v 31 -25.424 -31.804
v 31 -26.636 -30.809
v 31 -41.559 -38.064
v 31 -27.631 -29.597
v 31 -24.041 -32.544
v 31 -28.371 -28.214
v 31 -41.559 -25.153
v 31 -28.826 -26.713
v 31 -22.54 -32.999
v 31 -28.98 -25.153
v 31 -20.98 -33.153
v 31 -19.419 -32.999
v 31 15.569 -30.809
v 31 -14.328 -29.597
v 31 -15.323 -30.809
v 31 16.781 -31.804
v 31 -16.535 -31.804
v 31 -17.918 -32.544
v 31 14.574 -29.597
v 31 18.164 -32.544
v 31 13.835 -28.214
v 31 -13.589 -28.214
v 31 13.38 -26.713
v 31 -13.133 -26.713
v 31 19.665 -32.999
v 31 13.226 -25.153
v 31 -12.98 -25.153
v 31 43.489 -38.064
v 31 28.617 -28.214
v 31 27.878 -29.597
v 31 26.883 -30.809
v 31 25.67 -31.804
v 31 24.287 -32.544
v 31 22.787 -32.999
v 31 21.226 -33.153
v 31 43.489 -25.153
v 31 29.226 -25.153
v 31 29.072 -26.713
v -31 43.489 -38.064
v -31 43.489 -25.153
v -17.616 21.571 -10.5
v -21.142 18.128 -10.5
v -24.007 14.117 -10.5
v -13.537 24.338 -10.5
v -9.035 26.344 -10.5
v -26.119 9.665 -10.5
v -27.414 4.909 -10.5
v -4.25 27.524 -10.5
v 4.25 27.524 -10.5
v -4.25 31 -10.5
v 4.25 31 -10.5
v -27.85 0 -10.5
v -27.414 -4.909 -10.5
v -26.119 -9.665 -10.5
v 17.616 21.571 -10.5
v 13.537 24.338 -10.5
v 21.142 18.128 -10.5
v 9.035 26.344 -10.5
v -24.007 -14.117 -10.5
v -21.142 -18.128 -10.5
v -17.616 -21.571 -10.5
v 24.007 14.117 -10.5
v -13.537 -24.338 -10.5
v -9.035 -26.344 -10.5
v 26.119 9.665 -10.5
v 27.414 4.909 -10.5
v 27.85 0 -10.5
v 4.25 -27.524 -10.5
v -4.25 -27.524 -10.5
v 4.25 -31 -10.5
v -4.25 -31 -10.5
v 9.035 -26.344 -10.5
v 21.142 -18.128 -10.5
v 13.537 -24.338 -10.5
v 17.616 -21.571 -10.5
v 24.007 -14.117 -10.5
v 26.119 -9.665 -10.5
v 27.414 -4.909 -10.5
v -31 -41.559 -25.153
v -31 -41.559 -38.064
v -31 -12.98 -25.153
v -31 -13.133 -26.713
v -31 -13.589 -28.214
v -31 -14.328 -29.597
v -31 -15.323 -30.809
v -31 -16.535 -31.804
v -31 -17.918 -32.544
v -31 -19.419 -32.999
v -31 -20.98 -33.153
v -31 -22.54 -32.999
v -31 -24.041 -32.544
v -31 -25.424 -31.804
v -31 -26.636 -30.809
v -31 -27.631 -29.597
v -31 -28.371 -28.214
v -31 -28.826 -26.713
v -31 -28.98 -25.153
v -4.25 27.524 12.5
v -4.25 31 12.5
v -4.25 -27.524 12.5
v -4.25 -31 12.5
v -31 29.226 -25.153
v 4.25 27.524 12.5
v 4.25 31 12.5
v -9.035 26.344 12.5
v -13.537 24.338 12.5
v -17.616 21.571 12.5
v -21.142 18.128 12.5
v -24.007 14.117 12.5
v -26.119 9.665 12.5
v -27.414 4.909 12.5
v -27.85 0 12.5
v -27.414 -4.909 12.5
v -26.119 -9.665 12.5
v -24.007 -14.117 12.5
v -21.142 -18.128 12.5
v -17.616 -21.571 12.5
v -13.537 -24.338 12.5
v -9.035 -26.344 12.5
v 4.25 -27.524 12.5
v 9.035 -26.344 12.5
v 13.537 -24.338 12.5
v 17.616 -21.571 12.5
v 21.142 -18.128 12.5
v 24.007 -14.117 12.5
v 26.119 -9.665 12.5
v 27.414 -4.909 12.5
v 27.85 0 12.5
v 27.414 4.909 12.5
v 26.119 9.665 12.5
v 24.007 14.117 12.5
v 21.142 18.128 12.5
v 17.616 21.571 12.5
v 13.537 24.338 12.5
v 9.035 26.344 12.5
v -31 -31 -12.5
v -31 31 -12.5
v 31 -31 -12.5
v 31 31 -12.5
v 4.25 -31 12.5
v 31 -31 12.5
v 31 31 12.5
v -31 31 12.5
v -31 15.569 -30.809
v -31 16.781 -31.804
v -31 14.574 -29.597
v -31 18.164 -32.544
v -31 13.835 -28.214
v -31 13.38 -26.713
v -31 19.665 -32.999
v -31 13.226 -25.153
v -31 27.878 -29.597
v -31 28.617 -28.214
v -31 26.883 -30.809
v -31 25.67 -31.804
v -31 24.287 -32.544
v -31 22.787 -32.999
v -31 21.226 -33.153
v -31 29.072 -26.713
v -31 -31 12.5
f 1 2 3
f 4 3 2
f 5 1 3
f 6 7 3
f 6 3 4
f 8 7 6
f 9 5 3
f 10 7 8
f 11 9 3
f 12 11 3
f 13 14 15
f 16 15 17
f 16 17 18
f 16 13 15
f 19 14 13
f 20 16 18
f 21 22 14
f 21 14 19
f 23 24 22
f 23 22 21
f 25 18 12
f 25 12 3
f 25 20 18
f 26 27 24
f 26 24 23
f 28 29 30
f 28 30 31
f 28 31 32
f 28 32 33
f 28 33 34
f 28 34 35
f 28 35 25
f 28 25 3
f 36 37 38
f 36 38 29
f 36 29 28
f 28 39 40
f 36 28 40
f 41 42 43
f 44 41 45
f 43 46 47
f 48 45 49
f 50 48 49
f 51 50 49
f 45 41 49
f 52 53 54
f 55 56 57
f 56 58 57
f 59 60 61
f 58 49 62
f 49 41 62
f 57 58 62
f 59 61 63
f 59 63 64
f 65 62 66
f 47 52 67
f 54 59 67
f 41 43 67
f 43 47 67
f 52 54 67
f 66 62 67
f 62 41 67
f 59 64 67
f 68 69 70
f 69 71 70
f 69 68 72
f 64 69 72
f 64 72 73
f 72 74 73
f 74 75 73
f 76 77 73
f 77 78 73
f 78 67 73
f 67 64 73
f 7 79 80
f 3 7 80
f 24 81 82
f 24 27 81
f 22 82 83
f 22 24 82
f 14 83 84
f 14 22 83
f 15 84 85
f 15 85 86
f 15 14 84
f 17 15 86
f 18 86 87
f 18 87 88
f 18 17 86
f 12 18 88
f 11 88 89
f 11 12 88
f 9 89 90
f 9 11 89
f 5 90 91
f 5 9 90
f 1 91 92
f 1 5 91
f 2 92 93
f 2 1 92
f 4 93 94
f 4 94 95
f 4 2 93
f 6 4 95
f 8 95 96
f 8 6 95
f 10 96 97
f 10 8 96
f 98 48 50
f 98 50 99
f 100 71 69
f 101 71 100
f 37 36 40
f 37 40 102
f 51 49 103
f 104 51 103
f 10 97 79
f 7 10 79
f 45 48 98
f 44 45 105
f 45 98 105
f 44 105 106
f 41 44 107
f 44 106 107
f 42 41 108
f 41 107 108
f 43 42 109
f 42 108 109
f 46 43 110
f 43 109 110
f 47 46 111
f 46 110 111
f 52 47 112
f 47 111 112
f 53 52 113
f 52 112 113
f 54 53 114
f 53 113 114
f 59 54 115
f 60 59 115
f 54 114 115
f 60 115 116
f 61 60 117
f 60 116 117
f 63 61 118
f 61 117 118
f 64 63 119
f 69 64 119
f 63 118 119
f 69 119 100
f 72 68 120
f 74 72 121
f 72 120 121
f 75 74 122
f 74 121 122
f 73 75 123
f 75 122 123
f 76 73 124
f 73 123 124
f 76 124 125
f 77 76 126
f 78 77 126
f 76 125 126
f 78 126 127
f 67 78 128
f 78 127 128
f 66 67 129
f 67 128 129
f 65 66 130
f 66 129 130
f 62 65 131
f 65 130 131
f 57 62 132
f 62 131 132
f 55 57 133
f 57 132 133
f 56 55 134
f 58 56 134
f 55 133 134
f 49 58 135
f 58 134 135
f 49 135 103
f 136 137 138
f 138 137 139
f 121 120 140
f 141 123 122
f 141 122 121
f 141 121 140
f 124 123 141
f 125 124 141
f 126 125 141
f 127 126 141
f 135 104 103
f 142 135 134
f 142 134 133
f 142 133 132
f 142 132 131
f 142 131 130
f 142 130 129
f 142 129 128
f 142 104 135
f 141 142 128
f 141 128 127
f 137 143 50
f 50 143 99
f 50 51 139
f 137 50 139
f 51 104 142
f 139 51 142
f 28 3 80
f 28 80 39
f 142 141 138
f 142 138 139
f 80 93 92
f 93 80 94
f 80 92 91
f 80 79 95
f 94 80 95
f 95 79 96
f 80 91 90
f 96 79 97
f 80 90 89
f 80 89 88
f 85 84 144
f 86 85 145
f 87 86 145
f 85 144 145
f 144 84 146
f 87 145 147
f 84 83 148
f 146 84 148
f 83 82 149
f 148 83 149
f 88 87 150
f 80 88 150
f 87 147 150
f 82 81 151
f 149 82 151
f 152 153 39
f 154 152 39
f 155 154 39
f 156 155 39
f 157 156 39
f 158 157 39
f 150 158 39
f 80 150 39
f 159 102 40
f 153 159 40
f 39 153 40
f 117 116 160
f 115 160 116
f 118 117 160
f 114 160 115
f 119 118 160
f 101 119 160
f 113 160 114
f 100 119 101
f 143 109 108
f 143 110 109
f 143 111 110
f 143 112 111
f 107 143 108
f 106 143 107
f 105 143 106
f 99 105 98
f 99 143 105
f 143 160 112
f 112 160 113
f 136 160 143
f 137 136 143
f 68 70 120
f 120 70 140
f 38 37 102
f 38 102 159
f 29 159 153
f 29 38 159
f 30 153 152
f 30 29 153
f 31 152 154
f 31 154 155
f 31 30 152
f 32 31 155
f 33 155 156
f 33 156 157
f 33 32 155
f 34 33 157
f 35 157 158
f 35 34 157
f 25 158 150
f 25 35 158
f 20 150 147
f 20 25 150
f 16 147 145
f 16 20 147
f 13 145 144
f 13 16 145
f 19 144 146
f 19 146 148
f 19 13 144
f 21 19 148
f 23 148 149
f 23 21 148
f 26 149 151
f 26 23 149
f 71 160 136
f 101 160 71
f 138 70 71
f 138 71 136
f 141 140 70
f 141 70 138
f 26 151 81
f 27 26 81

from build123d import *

# Parameters (mm, degrees)
F0_W          = 62
F0_H          = 62
F1_DEPTH      = 12.5
F2_R          = 27.85
F3_DEPTH      = 23
F4_W          = 8.5
F4_H          = 23
F5_DEPTH      = 72.3
F7_DEPTH      = 31
F7_DEPTH_BACK = 31


with BuildPart() as f1:
    # F0 (on Top) → F1 (new body, symmetric)
    with BuildSketch(Plane.XY):
        Rectangle(F0_W, F0_H)
    extrude(amount=F1_DEPTH, both=True)

    # F2 (on face) → F3 (cut)
    with BuildSketch(Plane.XY.offset(12.5)):
        Circle(F2_R)
    extrude(amount=-F3_DEPTH, mode=Mode.SUBTRACT)

    # F4 (on face) → F5 (cut)
    with BuildSketch(Plane.XZ.offset(31)):
        with Locations((0, 1)):
            Rectangle(F4_W, F4_H)
    extrude(amount=-F5_DEPTH, mode=Mode.SUBTRACT)


with BuildPart() as f7:
    # F6 (on Right) → F7 (new body, two sides)
    with BuildSketch(Plane.YZ) as f7_sk:
        with BuildLine():
            Line((-28.979556, -25.152567), (-41.55941, -25.152567))
            Line((-41.55941, -25.152567), (-41.55941, -38.063945))
            Line((-41.55941, -38.063945), (43.488914, -38.063945))
            Line((43.488914, -38.063945), (43.488914, -25.152567))
            Line((43.488914, -25.152567), (29.225893, -25.152567))
            ThreePointArc((29.225893, -25.152567), (21.225893, -33.152567), (13.225893, -25.152567))
            Line((13.225893, -25.152567), (-12.979556, -25.152567))
            ThreePointArc((-12.979556, -25.152567), (-20.979556, -33.152567), (-28.979556, -25.152567))
        make_face()
    extrude(amount=F7_DEPTH)
    extrude(f7_sk.sketch, amount=-F7_DEPTH_BACK)


solid = Compound([f1.part, f7.part])
